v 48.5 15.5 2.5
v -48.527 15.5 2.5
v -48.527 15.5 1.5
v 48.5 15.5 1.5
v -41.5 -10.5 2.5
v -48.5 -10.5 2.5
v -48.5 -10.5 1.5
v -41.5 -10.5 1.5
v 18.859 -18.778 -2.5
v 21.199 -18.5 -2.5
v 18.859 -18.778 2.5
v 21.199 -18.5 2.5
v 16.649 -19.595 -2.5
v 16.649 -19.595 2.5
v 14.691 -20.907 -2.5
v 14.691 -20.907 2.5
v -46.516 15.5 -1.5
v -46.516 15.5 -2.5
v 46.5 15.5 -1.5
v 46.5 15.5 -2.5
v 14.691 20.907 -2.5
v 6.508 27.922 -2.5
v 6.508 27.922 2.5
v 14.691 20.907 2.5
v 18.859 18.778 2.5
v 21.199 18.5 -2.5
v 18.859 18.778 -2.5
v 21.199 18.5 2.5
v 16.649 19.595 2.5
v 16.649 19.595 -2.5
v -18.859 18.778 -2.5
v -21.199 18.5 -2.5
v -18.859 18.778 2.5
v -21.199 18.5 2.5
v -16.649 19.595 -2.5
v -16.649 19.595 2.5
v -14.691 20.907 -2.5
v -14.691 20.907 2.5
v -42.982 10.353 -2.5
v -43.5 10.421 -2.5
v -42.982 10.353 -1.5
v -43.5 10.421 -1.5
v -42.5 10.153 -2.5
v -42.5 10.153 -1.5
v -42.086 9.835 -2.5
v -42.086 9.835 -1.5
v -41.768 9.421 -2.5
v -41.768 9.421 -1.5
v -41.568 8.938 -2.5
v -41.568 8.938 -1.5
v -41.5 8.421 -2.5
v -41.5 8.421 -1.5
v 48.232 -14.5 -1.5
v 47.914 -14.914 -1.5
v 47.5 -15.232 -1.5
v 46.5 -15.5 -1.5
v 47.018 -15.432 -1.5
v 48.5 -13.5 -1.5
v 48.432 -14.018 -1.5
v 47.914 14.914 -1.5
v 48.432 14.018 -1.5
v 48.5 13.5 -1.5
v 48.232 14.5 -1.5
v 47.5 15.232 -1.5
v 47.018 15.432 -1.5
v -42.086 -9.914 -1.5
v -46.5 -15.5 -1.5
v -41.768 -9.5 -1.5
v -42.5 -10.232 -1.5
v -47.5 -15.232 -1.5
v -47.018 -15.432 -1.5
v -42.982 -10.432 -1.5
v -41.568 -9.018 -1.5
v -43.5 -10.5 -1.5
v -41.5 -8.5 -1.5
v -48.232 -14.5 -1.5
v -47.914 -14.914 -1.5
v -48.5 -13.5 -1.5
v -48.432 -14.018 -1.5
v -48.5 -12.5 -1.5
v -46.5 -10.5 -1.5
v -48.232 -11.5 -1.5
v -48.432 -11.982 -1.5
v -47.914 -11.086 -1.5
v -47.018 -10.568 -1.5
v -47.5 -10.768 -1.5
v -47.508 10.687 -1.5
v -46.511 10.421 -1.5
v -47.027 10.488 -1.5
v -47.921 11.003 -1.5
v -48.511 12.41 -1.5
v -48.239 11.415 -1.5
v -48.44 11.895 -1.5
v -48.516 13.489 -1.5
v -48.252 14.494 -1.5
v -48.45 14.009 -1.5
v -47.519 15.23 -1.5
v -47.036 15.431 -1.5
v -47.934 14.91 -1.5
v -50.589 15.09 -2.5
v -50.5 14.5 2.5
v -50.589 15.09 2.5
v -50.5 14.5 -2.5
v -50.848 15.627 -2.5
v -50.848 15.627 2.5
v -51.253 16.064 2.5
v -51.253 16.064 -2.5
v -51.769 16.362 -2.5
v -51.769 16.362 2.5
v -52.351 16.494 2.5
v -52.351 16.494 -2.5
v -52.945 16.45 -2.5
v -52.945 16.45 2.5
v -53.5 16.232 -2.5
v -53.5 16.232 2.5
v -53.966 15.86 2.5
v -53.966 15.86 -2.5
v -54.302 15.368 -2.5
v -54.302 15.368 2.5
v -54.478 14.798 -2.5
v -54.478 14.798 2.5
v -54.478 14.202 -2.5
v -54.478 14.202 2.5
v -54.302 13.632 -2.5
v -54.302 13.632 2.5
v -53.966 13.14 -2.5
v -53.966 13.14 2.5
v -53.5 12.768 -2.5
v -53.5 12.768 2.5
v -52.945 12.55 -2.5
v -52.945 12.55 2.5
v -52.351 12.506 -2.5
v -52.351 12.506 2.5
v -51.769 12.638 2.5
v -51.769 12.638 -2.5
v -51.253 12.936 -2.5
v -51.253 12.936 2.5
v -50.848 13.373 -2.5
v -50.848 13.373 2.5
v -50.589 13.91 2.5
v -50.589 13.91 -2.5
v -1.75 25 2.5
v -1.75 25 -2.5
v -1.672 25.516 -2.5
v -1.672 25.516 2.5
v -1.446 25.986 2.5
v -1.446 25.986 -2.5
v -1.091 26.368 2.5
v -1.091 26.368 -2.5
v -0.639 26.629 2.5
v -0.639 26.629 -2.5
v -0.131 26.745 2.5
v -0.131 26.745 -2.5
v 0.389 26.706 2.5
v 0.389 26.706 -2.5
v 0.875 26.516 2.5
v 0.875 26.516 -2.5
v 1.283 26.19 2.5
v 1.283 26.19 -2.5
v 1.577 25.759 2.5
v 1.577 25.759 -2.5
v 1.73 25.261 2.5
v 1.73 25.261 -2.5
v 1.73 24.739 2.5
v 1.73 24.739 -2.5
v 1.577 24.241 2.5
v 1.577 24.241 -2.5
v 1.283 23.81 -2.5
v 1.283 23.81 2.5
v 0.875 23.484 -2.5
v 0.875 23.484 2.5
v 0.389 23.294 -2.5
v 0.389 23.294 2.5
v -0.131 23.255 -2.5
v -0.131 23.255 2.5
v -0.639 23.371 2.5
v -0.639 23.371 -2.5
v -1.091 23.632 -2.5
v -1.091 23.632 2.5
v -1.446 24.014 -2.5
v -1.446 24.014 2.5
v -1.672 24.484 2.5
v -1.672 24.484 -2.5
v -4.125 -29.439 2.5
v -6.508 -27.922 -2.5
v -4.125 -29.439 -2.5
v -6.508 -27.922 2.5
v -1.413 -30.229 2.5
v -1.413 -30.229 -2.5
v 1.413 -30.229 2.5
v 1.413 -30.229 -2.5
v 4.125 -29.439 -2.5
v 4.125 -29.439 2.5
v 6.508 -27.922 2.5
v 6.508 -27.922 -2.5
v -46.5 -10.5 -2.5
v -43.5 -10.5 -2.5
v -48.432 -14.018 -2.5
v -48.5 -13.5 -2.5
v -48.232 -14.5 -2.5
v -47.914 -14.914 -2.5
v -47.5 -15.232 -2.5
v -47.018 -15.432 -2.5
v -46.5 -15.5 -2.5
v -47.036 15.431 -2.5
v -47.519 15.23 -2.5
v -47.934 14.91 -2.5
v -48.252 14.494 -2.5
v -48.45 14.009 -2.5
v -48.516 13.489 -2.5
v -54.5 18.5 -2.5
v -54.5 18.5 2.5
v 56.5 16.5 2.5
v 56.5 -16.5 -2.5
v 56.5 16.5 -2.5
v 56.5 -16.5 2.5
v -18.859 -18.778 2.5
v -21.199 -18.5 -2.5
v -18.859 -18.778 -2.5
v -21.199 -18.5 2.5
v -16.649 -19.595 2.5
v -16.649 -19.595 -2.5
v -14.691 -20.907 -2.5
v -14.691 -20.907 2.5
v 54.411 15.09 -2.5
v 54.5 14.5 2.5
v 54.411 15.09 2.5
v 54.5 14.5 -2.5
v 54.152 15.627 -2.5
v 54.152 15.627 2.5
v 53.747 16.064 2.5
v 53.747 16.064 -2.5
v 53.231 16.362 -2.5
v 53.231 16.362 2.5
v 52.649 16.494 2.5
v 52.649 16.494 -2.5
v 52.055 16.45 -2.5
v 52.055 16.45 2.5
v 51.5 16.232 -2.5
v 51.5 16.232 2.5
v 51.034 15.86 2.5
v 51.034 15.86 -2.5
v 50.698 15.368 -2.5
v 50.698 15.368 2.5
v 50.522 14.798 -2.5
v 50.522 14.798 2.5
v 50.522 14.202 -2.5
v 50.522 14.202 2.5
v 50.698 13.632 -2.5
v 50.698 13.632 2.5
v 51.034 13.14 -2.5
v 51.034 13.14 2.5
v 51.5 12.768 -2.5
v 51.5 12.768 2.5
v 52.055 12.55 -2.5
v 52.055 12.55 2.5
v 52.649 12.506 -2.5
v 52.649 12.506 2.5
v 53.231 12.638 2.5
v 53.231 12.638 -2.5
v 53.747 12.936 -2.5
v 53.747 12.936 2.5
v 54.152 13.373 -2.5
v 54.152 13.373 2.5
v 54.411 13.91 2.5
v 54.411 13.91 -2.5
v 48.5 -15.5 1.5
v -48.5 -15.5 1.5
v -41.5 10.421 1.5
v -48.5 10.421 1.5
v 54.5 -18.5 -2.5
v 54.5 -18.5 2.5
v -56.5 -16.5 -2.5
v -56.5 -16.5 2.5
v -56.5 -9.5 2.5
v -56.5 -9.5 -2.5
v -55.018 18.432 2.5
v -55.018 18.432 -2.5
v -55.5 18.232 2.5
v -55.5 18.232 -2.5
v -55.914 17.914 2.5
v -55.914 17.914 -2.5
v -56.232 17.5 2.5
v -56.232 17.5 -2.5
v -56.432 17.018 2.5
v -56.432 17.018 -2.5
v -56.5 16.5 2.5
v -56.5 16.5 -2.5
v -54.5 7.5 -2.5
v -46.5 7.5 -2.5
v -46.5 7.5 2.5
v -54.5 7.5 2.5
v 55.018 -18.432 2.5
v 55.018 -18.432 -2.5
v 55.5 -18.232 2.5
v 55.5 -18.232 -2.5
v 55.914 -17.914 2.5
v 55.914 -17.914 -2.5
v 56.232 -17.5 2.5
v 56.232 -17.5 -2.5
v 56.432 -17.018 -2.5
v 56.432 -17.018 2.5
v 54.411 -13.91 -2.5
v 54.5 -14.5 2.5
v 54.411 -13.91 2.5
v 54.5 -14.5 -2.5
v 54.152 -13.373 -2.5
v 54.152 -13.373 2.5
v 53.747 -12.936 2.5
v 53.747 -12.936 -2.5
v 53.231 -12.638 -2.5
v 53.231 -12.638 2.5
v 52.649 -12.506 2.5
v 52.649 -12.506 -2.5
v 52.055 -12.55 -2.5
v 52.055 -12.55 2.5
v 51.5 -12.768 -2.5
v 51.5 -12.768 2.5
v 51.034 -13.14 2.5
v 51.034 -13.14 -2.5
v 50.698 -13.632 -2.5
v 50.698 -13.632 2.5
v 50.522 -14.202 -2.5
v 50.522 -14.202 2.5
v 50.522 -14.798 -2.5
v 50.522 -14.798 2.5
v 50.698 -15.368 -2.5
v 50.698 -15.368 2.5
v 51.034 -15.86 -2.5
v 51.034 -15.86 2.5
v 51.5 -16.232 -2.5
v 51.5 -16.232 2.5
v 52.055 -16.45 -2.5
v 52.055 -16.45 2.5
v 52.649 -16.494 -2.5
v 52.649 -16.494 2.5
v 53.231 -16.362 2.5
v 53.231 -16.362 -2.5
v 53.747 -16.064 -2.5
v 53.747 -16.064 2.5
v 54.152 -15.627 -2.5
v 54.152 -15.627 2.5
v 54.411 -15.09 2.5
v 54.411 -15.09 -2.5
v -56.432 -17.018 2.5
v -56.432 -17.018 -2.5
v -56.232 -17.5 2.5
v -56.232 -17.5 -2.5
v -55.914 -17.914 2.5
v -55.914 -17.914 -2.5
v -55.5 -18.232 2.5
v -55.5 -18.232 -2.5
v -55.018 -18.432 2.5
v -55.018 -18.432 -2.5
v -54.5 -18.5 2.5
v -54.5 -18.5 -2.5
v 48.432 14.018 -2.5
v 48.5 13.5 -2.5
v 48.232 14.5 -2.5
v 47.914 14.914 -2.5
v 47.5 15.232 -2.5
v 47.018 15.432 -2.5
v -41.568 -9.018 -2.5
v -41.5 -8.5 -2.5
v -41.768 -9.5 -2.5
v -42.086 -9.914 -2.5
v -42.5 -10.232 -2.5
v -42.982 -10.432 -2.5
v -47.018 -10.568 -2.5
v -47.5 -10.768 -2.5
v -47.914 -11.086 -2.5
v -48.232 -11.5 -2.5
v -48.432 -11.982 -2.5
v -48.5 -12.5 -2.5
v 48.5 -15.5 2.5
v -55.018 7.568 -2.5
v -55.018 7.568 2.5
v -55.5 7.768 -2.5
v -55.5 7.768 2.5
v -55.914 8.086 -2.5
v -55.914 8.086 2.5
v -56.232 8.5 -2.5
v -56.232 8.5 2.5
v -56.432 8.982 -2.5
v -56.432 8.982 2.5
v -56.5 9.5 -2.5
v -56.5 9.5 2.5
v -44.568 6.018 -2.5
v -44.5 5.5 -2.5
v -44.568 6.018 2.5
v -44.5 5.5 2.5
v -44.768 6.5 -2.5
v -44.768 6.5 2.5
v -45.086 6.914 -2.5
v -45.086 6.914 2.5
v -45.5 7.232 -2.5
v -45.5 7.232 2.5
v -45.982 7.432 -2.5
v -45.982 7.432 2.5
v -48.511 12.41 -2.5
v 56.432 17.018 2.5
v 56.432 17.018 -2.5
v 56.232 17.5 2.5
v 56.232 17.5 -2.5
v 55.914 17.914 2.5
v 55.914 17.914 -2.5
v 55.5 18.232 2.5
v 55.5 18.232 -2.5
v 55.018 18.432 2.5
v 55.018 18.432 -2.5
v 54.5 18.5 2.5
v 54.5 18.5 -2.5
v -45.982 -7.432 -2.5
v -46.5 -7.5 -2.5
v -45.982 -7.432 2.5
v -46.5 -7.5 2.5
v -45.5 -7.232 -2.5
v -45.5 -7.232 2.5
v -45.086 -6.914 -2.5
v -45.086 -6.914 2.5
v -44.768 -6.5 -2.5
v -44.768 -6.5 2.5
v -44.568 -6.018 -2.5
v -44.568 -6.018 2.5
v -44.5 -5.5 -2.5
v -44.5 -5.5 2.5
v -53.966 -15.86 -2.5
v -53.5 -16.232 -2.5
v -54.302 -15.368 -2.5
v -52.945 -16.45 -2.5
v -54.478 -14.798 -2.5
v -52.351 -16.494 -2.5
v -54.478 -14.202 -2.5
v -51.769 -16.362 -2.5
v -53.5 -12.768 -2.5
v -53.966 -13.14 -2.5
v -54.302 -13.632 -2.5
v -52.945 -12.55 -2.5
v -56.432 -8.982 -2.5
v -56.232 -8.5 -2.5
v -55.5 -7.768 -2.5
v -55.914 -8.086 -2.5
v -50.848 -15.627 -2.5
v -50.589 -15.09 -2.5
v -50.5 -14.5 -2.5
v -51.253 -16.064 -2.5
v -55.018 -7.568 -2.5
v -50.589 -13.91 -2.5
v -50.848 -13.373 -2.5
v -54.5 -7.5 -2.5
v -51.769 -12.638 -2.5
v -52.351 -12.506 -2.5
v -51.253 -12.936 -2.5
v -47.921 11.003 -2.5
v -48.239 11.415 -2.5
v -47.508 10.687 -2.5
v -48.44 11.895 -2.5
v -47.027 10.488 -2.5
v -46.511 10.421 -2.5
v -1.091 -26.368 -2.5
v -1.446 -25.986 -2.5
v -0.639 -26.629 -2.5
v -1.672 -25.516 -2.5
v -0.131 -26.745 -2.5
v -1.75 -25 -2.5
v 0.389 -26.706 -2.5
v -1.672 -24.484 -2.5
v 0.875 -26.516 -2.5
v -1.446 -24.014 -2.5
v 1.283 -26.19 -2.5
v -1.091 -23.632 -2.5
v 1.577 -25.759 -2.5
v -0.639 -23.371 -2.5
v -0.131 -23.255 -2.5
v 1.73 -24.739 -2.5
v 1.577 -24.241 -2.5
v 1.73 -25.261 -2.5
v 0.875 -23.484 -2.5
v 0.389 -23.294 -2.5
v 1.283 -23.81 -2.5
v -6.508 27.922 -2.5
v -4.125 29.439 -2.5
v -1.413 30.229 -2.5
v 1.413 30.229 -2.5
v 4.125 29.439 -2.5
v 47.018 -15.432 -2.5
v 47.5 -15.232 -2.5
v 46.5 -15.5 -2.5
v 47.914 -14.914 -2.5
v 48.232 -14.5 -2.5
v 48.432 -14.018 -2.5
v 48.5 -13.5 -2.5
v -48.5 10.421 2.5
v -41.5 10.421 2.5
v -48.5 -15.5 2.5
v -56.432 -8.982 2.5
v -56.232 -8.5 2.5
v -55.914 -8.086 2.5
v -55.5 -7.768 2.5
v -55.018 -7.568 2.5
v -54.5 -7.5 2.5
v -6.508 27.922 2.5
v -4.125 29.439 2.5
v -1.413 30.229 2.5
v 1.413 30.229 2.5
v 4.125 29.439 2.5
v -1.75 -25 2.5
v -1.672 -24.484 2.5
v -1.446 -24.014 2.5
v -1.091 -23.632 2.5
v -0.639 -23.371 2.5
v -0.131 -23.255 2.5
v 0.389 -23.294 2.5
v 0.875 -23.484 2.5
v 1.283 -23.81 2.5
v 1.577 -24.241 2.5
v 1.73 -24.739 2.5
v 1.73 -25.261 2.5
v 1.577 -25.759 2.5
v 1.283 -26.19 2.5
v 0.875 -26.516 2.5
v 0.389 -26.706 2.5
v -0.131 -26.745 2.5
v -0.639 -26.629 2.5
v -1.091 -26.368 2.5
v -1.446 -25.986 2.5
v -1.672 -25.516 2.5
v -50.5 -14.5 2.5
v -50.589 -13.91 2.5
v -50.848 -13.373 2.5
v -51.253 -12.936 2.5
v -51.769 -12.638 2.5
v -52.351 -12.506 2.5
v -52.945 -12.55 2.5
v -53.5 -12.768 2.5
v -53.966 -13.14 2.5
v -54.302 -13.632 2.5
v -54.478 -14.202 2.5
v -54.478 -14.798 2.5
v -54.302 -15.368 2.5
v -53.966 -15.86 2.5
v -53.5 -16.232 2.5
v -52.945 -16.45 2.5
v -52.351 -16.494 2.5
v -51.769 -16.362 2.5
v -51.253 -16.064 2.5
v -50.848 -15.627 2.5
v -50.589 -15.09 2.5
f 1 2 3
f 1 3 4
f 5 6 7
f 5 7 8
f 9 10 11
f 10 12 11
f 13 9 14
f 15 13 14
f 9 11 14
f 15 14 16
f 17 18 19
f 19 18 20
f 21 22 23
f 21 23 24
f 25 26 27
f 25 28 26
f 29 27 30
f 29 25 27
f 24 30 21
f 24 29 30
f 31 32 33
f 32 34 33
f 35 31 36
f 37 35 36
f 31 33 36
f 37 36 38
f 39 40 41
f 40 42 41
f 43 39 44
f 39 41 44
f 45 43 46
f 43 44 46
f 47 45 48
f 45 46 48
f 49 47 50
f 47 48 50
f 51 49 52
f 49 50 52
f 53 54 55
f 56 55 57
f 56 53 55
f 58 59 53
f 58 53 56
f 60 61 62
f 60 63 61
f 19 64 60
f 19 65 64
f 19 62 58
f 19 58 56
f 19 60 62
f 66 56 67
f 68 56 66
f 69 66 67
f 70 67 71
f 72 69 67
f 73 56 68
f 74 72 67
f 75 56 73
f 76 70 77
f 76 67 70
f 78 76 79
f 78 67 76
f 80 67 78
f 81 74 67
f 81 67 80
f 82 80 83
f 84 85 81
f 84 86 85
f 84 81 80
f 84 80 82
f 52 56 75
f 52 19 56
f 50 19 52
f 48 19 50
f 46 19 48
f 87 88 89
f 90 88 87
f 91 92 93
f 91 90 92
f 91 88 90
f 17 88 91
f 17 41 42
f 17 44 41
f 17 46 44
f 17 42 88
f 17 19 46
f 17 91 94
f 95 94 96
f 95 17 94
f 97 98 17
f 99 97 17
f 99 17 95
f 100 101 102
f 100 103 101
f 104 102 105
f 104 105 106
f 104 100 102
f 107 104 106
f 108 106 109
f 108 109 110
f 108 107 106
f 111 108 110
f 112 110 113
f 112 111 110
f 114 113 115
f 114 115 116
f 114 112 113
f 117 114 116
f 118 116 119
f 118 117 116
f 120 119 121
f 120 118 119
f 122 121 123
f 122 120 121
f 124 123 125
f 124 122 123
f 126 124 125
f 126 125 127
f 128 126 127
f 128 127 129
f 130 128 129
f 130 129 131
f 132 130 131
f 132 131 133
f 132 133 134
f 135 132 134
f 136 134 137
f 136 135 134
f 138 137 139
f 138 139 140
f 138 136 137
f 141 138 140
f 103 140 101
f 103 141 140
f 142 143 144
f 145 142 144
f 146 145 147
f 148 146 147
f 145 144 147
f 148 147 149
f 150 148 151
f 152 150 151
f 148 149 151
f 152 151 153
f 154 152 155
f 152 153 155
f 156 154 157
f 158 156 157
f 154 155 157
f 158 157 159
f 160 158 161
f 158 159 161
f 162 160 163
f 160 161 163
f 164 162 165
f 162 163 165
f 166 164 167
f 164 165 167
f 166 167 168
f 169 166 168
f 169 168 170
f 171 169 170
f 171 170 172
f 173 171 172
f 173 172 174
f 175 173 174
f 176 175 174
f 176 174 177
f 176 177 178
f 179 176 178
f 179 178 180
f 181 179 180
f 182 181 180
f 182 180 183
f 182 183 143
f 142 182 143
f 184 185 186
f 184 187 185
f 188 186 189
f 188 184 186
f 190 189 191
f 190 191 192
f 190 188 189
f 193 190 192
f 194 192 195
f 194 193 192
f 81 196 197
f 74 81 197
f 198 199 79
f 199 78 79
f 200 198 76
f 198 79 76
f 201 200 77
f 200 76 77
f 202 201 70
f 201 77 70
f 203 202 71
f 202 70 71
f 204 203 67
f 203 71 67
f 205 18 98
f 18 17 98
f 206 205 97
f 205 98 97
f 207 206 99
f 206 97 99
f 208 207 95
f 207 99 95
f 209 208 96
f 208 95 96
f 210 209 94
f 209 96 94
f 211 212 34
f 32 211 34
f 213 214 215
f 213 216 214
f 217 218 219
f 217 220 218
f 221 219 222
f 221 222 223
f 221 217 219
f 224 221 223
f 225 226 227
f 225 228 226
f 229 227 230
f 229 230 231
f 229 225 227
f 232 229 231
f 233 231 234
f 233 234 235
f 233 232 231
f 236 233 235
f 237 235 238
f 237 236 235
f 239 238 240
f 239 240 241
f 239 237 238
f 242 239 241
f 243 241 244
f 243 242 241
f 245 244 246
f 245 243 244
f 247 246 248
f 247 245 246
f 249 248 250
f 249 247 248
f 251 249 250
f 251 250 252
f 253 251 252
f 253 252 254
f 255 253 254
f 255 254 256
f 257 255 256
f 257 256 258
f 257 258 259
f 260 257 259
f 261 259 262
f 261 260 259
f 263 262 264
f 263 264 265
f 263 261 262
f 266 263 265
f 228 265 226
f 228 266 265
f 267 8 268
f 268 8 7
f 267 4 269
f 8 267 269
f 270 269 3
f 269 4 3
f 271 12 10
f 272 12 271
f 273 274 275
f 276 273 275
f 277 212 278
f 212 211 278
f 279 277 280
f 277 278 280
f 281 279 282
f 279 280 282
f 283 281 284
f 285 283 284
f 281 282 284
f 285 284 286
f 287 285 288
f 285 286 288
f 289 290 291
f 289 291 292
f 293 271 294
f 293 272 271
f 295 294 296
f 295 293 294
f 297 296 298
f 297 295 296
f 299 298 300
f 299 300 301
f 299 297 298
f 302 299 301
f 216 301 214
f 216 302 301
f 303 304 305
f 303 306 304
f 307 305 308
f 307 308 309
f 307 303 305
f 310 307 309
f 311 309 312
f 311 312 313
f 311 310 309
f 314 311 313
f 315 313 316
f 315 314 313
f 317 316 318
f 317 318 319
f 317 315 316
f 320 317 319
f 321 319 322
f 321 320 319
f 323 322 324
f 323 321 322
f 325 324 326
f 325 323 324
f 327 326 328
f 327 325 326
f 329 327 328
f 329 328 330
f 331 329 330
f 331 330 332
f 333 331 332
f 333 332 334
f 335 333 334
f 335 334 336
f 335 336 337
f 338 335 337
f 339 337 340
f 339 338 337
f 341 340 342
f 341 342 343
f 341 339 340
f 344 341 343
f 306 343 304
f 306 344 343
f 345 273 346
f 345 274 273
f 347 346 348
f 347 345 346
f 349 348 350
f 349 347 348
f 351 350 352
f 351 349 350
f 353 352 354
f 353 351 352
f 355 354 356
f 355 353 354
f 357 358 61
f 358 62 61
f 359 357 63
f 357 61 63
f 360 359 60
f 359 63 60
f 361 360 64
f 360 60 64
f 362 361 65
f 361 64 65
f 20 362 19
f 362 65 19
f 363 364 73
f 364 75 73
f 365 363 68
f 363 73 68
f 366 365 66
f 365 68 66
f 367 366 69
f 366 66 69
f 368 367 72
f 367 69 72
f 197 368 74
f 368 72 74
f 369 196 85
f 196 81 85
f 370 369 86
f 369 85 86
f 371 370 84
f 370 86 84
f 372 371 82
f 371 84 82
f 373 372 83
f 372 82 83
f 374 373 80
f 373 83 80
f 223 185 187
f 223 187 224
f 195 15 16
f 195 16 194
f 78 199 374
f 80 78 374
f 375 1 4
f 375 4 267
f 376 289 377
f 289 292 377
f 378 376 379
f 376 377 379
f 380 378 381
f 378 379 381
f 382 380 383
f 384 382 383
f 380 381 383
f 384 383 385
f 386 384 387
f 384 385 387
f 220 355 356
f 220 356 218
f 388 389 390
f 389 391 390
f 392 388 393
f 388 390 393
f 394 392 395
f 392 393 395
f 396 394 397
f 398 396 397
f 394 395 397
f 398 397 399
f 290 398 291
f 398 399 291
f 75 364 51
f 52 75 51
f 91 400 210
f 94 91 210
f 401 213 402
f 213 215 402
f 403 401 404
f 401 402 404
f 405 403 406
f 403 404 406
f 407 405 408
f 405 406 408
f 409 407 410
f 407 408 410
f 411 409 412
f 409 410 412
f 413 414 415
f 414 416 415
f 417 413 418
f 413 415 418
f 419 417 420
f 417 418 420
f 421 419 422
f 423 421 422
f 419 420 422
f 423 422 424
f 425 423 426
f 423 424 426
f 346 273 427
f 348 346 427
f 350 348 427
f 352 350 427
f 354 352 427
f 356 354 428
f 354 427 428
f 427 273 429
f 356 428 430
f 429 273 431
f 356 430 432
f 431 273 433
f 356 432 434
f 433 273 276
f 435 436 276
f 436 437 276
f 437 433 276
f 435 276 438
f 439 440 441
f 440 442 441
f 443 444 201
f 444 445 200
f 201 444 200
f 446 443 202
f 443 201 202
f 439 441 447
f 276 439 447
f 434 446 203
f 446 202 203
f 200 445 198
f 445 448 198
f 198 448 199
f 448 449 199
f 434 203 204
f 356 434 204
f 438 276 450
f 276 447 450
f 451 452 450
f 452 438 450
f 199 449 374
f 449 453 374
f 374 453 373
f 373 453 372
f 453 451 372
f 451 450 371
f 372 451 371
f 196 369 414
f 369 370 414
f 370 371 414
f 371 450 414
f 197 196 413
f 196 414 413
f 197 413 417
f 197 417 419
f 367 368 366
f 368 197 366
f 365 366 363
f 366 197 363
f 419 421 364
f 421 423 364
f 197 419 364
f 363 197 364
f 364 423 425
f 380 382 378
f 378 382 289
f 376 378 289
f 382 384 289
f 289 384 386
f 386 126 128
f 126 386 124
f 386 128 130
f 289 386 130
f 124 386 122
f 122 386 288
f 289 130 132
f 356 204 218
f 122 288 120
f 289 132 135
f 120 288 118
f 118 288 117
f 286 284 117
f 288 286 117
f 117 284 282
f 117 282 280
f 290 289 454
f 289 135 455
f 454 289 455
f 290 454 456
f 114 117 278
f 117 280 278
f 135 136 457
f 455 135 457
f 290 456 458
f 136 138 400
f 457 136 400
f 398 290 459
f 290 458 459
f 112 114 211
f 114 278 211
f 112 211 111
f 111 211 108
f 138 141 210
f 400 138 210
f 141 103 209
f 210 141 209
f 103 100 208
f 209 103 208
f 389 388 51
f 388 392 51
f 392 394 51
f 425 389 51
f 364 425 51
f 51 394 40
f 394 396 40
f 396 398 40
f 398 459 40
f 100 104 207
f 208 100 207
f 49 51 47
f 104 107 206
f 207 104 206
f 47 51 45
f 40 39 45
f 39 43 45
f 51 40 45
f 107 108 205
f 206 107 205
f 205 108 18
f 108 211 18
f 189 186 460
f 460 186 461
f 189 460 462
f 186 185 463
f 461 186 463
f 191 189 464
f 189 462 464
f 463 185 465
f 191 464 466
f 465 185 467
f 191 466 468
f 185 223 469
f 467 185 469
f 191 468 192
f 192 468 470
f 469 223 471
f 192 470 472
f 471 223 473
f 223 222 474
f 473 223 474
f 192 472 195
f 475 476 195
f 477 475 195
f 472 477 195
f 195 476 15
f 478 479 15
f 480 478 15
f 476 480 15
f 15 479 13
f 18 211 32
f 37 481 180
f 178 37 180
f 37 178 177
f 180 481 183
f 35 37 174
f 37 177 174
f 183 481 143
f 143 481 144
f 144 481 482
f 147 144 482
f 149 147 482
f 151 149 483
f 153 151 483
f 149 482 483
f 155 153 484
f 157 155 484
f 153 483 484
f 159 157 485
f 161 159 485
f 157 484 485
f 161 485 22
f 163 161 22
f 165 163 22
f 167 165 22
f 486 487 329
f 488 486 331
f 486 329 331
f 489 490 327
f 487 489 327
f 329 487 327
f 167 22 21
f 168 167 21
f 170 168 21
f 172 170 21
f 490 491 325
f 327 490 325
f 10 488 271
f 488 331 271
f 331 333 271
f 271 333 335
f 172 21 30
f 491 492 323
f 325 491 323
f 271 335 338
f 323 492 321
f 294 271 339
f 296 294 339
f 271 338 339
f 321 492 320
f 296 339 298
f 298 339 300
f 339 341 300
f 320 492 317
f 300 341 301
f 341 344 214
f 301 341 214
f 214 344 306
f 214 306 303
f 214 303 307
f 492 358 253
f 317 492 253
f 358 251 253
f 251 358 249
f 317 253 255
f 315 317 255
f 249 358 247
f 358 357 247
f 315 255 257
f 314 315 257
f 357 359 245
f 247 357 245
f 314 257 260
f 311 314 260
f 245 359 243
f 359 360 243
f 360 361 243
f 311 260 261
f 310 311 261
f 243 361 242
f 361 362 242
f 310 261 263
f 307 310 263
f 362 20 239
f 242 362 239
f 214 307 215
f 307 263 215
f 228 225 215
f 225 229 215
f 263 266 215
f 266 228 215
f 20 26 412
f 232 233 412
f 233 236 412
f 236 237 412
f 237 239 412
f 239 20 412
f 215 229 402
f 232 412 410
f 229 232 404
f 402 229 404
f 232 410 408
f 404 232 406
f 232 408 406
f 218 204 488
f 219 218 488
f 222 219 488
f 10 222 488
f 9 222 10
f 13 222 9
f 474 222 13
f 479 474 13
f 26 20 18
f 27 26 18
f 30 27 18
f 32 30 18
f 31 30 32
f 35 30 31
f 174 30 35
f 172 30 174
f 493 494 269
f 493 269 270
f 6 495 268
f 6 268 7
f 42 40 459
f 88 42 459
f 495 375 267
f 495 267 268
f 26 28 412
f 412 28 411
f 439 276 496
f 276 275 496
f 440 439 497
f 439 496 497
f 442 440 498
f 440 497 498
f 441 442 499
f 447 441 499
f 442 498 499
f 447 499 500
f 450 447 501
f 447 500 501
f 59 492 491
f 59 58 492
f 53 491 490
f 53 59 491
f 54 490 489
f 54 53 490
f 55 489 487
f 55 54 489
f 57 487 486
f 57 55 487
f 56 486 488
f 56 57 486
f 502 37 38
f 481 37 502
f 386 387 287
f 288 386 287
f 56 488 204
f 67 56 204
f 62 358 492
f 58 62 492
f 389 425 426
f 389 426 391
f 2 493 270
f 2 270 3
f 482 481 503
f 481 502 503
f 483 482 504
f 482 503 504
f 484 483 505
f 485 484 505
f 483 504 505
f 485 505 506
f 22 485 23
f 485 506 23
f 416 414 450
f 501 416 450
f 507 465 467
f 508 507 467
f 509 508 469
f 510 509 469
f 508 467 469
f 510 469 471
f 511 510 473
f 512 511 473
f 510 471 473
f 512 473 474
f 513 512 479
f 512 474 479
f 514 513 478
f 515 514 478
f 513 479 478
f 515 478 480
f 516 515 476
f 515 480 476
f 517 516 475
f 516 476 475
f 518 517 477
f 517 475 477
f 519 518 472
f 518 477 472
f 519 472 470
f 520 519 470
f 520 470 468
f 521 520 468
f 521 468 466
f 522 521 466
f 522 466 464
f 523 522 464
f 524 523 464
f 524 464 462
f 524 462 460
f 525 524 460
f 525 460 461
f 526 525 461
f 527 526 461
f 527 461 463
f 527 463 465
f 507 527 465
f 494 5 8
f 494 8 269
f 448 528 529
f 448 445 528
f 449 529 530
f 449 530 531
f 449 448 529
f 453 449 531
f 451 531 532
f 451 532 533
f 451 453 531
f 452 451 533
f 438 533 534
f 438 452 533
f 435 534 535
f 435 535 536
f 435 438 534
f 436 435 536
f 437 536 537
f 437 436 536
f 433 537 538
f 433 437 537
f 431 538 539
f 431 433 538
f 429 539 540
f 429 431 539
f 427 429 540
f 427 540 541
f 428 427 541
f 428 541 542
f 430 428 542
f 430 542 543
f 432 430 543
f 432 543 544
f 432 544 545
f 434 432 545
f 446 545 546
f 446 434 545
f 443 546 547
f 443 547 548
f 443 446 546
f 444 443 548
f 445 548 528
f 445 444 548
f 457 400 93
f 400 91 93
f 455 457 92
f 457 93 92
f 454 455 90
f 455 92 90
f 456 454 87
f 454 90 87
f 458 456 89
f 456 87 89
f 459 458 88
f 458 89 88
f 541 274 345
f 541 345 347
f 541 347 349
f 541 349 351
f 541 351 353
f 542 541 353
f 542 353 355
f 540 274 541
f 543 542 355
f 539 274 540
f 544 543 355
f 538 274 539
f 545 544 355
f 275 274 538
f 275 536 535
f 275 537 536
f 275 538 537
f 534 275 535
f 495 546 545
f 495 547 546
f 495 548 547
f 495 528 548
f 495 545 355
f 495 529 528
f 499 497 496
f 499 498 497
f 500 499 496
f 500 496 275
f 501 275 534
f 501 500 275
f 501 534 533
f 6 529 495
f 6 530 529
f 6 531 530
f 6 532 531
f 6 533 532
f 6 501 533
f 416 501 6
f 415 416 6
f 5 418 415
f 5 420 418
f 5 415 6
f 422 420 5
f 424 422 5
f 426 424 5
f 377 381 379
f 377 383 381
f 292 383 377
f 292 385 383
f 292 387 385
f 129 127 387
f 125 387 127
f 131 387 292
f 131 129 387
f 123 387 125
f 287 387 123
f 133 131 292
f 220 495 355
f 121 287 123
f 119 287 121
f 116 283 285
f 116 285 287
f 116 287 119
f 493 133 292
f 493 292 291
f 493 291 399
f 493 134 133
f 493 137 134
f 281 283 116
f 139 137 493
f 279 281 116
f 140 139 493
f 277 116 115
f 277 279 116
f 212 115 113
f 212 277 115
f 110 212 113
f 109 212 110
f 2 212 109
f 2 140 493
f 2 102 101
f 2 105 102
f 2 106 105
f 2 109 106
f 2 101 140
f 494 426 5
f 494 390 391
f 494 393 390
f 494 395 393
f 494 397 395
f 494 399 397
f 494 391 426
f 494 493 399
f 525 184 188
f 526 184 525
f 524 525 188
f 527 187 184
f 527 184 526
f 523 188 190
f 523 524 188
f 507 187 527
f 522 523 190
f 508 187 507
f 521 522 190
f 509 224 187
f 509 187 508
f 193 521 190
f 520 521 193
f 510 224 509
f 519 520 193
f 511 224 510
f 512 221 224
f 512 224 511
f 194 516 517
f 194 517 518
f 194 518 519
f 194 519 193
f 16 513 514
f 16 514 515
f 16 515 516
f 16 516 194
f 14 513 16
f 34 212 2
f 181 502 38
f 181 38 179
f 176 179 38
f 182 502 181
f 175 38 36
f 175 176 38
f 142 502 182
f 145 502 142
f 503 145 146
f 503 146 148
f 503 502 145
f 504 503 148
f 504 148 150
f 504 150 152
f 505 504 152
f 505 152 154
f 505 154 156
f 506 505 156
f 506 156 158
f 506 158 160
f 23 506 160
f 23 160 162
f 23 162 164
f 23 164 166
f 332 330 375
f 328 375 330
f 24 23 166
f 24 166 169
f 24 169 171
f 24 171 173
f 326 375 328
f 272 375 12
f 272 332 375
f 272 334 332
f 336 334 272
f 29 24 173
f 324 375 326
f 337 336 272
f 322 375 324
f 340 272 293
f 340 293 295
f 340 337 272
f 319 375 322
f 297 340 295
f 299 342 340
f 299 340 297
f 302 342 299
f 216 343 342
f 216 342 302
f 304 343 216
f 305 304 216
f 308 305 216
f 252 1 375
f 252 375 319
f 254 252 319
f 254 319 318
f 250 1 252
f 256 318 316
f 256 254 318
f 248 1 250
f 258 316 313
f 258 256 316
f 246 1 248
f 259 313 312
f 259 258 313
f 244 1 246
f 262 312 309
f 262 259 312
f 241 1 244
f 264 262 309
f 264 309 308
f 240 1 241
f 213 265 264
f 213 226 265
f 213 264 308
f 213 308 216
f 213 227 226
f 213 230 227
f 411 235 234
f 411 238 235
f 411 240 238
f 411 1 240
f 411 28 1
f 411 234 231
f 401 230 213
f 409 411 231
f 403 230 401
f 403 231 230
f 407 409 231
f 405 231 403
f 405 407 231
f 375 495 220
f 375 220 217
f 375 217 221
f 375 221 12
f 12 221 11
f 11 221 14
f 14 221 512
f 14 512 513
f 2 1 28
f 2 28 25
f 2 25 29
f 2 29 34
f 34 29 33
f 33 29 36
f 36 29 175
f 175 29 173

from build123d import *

# Parameters (mm, degrees)
SKETCH_1_W          = 113
SKETCH_1_H          = 37
SKETCH_1_R          = 2
EXTRUDE_1_DEPTH     = 2.5
SKETCH_2_W          = 12
SKETCH_2_H          = 15
CUT_EXTRUDE_1_DEPTH = 6
CUT_EXTRUDE_2_DEPTH = 1
FILLET_1_R          = 2
FILLET_2_R          = 2
EXTRUDE_2_DEPTH     = 5
FILLET_3_R          = 10
SKETCH_5_R          = 1.75
CUT_EXTRUDE_3_DEPTH = 6


with BuildPart() as part:
    # 草图1 → 凸台-拉伸1 (new body, symmetric)
    with BuildSketch(Plane.XY):
        Rectangle(SKETCH_1_W, SKETCH_1_H)
        with Locations((52.5, 14.5)):
            Circle(SKETCH_1_R, mode=Mode.SUBTRACT)
        with Locations((52.5, -14.5)):
            Circle(SKETCH_1_R, mode=Mode.SUBTRACT)
        with Locations((-52.5, -14.5)):
            Circle(SKETCH_1_R, mode=Mode.SUBTRACT)
        with Locations((-52.5, 14.5)):
            Circle(SKETCH_1_R, mode=Mode.SUBTRACT)
    extrude(amount=EXTRUDE_1_DEPTH, both=True)

    # 草图2 → 切除-拉伸1 (cut, through all)
    with BuildSketch(Plane(origin=(0, 0, -2.5), x_dir=(-1, 0, 0), z_dir=(0, 0, -1))):
        with Locations((50.5, 0)):
            Rectangle(SKETCH_2_W, SKETCH_2_H)
    extrude(amount=-CUT_EXTRUDE_1_DEPTH, mode=Mode.SUBTRACT)

    # 草图3 → 切除-拉伸2 (cut)
    with BuildSketch(Plane(origin=(0, 0, -2.5), x_dir=(-1, 0, 0), z_dir=(0, 0, -1))):
        Polygon((-48.5, -15.5), (48.500097741, -15.5), (48.500097741, -10.5), (41.5, -10.5), (41.5, 10.420732232), (48.500097741, 10.420732232), (48.526939222, 15.5), (-48.5, 15.5), align=None)
    cut_extrude_2 = extrude(amount=-CUT_EXTRUDE_2_DEPTH, mode=Mode.SUBTRACT)

    # 圆角1
    fillet_1_edges = [part.edges().sort_by_distance(p)[0] for p in [
        (48.5, -15.5, -2),
        (48.5, 15.5, -2),
        (-48.526939222, 15.5, -2),
        (-48.500097741, 10.420732232, -2),
        (-41.5, 10.420732232, -2),
        (-41.5, -10.5, -2),
        (-48.500097741, -10.5, -2),
        (-48.500097741, -15.5, -2),
    ]]
    fillet(fillet_1_edges, radius=FILLET_1_R)

    # 圆角2
    fillet_2_edges = [part.edges().sort_by_distance(p)[0] for p in [
        (-56.5, 7.5, 0),
        (-56.5, -7.5, 0),
        (-44.5, -7.5, 0),
        (-44.5, 7.5, 0),
        (-56.5, 18.5, 0),
        (56.5, 18.5, 0),
        (56.5, -18.5, 0),
        (-56.5, -18.5, 0),
    ]]
    fillet(fillet_2_edges, radius=FILLET_2_R)

    # 草图4 → 凸台-拉伸2 (add)
    with BuildSketch(Plane(origin=(0, 0, -2.5), x_dir=(-1, 0, 0), z_dir=(0, 0, -1))):
        Polygon((17.5, 18.5), (0, 33.5), (-17.5, 18.5), align=None)
        Polygon((17.5, -18.5), (-17.5, -18.5), (0, -33.5), align=None)
    extrude(amount=-EXTRUDE_2_DEPTH)

    # 圆角3
    fillet_3_edges = [part.edges().sort_by_distance(p)[0] for p in [
        (-17.5, 18.5, 0),
        (17.5, 18.5, 0),
        (0, 33.5, 0),
        (0, -33.5, 0),
        (17.5, -18.5, 0),
        (-17.5, -18.5, 0),
    ]]
    fillet(fillet_3_edges, radius=FILLET_3_R)

    # 草图5 → 切除-拉伸3 (cut, through all)
    with BuildSketch(Plane(origin=(0, 0, -2.5), x_dir=(-1, 0, 0), z_dir=(0, 0, -1))):
        with Locations((0, -25)):
            Circle(SKETCH_5_R)
        with Locations((0, 25)):
            Circle(SKETCH_5_R)
    extrude(amount=-CUT_EXTRUDE_3_DEPTH, mode=Mode.SUBTRACT)

    # 镜向1: 切除-拉伸2 across plane
    add(cut_extrude_2.mirror(Plane.XY), mode=Mode.SUBTRACT)


solid = part.part
